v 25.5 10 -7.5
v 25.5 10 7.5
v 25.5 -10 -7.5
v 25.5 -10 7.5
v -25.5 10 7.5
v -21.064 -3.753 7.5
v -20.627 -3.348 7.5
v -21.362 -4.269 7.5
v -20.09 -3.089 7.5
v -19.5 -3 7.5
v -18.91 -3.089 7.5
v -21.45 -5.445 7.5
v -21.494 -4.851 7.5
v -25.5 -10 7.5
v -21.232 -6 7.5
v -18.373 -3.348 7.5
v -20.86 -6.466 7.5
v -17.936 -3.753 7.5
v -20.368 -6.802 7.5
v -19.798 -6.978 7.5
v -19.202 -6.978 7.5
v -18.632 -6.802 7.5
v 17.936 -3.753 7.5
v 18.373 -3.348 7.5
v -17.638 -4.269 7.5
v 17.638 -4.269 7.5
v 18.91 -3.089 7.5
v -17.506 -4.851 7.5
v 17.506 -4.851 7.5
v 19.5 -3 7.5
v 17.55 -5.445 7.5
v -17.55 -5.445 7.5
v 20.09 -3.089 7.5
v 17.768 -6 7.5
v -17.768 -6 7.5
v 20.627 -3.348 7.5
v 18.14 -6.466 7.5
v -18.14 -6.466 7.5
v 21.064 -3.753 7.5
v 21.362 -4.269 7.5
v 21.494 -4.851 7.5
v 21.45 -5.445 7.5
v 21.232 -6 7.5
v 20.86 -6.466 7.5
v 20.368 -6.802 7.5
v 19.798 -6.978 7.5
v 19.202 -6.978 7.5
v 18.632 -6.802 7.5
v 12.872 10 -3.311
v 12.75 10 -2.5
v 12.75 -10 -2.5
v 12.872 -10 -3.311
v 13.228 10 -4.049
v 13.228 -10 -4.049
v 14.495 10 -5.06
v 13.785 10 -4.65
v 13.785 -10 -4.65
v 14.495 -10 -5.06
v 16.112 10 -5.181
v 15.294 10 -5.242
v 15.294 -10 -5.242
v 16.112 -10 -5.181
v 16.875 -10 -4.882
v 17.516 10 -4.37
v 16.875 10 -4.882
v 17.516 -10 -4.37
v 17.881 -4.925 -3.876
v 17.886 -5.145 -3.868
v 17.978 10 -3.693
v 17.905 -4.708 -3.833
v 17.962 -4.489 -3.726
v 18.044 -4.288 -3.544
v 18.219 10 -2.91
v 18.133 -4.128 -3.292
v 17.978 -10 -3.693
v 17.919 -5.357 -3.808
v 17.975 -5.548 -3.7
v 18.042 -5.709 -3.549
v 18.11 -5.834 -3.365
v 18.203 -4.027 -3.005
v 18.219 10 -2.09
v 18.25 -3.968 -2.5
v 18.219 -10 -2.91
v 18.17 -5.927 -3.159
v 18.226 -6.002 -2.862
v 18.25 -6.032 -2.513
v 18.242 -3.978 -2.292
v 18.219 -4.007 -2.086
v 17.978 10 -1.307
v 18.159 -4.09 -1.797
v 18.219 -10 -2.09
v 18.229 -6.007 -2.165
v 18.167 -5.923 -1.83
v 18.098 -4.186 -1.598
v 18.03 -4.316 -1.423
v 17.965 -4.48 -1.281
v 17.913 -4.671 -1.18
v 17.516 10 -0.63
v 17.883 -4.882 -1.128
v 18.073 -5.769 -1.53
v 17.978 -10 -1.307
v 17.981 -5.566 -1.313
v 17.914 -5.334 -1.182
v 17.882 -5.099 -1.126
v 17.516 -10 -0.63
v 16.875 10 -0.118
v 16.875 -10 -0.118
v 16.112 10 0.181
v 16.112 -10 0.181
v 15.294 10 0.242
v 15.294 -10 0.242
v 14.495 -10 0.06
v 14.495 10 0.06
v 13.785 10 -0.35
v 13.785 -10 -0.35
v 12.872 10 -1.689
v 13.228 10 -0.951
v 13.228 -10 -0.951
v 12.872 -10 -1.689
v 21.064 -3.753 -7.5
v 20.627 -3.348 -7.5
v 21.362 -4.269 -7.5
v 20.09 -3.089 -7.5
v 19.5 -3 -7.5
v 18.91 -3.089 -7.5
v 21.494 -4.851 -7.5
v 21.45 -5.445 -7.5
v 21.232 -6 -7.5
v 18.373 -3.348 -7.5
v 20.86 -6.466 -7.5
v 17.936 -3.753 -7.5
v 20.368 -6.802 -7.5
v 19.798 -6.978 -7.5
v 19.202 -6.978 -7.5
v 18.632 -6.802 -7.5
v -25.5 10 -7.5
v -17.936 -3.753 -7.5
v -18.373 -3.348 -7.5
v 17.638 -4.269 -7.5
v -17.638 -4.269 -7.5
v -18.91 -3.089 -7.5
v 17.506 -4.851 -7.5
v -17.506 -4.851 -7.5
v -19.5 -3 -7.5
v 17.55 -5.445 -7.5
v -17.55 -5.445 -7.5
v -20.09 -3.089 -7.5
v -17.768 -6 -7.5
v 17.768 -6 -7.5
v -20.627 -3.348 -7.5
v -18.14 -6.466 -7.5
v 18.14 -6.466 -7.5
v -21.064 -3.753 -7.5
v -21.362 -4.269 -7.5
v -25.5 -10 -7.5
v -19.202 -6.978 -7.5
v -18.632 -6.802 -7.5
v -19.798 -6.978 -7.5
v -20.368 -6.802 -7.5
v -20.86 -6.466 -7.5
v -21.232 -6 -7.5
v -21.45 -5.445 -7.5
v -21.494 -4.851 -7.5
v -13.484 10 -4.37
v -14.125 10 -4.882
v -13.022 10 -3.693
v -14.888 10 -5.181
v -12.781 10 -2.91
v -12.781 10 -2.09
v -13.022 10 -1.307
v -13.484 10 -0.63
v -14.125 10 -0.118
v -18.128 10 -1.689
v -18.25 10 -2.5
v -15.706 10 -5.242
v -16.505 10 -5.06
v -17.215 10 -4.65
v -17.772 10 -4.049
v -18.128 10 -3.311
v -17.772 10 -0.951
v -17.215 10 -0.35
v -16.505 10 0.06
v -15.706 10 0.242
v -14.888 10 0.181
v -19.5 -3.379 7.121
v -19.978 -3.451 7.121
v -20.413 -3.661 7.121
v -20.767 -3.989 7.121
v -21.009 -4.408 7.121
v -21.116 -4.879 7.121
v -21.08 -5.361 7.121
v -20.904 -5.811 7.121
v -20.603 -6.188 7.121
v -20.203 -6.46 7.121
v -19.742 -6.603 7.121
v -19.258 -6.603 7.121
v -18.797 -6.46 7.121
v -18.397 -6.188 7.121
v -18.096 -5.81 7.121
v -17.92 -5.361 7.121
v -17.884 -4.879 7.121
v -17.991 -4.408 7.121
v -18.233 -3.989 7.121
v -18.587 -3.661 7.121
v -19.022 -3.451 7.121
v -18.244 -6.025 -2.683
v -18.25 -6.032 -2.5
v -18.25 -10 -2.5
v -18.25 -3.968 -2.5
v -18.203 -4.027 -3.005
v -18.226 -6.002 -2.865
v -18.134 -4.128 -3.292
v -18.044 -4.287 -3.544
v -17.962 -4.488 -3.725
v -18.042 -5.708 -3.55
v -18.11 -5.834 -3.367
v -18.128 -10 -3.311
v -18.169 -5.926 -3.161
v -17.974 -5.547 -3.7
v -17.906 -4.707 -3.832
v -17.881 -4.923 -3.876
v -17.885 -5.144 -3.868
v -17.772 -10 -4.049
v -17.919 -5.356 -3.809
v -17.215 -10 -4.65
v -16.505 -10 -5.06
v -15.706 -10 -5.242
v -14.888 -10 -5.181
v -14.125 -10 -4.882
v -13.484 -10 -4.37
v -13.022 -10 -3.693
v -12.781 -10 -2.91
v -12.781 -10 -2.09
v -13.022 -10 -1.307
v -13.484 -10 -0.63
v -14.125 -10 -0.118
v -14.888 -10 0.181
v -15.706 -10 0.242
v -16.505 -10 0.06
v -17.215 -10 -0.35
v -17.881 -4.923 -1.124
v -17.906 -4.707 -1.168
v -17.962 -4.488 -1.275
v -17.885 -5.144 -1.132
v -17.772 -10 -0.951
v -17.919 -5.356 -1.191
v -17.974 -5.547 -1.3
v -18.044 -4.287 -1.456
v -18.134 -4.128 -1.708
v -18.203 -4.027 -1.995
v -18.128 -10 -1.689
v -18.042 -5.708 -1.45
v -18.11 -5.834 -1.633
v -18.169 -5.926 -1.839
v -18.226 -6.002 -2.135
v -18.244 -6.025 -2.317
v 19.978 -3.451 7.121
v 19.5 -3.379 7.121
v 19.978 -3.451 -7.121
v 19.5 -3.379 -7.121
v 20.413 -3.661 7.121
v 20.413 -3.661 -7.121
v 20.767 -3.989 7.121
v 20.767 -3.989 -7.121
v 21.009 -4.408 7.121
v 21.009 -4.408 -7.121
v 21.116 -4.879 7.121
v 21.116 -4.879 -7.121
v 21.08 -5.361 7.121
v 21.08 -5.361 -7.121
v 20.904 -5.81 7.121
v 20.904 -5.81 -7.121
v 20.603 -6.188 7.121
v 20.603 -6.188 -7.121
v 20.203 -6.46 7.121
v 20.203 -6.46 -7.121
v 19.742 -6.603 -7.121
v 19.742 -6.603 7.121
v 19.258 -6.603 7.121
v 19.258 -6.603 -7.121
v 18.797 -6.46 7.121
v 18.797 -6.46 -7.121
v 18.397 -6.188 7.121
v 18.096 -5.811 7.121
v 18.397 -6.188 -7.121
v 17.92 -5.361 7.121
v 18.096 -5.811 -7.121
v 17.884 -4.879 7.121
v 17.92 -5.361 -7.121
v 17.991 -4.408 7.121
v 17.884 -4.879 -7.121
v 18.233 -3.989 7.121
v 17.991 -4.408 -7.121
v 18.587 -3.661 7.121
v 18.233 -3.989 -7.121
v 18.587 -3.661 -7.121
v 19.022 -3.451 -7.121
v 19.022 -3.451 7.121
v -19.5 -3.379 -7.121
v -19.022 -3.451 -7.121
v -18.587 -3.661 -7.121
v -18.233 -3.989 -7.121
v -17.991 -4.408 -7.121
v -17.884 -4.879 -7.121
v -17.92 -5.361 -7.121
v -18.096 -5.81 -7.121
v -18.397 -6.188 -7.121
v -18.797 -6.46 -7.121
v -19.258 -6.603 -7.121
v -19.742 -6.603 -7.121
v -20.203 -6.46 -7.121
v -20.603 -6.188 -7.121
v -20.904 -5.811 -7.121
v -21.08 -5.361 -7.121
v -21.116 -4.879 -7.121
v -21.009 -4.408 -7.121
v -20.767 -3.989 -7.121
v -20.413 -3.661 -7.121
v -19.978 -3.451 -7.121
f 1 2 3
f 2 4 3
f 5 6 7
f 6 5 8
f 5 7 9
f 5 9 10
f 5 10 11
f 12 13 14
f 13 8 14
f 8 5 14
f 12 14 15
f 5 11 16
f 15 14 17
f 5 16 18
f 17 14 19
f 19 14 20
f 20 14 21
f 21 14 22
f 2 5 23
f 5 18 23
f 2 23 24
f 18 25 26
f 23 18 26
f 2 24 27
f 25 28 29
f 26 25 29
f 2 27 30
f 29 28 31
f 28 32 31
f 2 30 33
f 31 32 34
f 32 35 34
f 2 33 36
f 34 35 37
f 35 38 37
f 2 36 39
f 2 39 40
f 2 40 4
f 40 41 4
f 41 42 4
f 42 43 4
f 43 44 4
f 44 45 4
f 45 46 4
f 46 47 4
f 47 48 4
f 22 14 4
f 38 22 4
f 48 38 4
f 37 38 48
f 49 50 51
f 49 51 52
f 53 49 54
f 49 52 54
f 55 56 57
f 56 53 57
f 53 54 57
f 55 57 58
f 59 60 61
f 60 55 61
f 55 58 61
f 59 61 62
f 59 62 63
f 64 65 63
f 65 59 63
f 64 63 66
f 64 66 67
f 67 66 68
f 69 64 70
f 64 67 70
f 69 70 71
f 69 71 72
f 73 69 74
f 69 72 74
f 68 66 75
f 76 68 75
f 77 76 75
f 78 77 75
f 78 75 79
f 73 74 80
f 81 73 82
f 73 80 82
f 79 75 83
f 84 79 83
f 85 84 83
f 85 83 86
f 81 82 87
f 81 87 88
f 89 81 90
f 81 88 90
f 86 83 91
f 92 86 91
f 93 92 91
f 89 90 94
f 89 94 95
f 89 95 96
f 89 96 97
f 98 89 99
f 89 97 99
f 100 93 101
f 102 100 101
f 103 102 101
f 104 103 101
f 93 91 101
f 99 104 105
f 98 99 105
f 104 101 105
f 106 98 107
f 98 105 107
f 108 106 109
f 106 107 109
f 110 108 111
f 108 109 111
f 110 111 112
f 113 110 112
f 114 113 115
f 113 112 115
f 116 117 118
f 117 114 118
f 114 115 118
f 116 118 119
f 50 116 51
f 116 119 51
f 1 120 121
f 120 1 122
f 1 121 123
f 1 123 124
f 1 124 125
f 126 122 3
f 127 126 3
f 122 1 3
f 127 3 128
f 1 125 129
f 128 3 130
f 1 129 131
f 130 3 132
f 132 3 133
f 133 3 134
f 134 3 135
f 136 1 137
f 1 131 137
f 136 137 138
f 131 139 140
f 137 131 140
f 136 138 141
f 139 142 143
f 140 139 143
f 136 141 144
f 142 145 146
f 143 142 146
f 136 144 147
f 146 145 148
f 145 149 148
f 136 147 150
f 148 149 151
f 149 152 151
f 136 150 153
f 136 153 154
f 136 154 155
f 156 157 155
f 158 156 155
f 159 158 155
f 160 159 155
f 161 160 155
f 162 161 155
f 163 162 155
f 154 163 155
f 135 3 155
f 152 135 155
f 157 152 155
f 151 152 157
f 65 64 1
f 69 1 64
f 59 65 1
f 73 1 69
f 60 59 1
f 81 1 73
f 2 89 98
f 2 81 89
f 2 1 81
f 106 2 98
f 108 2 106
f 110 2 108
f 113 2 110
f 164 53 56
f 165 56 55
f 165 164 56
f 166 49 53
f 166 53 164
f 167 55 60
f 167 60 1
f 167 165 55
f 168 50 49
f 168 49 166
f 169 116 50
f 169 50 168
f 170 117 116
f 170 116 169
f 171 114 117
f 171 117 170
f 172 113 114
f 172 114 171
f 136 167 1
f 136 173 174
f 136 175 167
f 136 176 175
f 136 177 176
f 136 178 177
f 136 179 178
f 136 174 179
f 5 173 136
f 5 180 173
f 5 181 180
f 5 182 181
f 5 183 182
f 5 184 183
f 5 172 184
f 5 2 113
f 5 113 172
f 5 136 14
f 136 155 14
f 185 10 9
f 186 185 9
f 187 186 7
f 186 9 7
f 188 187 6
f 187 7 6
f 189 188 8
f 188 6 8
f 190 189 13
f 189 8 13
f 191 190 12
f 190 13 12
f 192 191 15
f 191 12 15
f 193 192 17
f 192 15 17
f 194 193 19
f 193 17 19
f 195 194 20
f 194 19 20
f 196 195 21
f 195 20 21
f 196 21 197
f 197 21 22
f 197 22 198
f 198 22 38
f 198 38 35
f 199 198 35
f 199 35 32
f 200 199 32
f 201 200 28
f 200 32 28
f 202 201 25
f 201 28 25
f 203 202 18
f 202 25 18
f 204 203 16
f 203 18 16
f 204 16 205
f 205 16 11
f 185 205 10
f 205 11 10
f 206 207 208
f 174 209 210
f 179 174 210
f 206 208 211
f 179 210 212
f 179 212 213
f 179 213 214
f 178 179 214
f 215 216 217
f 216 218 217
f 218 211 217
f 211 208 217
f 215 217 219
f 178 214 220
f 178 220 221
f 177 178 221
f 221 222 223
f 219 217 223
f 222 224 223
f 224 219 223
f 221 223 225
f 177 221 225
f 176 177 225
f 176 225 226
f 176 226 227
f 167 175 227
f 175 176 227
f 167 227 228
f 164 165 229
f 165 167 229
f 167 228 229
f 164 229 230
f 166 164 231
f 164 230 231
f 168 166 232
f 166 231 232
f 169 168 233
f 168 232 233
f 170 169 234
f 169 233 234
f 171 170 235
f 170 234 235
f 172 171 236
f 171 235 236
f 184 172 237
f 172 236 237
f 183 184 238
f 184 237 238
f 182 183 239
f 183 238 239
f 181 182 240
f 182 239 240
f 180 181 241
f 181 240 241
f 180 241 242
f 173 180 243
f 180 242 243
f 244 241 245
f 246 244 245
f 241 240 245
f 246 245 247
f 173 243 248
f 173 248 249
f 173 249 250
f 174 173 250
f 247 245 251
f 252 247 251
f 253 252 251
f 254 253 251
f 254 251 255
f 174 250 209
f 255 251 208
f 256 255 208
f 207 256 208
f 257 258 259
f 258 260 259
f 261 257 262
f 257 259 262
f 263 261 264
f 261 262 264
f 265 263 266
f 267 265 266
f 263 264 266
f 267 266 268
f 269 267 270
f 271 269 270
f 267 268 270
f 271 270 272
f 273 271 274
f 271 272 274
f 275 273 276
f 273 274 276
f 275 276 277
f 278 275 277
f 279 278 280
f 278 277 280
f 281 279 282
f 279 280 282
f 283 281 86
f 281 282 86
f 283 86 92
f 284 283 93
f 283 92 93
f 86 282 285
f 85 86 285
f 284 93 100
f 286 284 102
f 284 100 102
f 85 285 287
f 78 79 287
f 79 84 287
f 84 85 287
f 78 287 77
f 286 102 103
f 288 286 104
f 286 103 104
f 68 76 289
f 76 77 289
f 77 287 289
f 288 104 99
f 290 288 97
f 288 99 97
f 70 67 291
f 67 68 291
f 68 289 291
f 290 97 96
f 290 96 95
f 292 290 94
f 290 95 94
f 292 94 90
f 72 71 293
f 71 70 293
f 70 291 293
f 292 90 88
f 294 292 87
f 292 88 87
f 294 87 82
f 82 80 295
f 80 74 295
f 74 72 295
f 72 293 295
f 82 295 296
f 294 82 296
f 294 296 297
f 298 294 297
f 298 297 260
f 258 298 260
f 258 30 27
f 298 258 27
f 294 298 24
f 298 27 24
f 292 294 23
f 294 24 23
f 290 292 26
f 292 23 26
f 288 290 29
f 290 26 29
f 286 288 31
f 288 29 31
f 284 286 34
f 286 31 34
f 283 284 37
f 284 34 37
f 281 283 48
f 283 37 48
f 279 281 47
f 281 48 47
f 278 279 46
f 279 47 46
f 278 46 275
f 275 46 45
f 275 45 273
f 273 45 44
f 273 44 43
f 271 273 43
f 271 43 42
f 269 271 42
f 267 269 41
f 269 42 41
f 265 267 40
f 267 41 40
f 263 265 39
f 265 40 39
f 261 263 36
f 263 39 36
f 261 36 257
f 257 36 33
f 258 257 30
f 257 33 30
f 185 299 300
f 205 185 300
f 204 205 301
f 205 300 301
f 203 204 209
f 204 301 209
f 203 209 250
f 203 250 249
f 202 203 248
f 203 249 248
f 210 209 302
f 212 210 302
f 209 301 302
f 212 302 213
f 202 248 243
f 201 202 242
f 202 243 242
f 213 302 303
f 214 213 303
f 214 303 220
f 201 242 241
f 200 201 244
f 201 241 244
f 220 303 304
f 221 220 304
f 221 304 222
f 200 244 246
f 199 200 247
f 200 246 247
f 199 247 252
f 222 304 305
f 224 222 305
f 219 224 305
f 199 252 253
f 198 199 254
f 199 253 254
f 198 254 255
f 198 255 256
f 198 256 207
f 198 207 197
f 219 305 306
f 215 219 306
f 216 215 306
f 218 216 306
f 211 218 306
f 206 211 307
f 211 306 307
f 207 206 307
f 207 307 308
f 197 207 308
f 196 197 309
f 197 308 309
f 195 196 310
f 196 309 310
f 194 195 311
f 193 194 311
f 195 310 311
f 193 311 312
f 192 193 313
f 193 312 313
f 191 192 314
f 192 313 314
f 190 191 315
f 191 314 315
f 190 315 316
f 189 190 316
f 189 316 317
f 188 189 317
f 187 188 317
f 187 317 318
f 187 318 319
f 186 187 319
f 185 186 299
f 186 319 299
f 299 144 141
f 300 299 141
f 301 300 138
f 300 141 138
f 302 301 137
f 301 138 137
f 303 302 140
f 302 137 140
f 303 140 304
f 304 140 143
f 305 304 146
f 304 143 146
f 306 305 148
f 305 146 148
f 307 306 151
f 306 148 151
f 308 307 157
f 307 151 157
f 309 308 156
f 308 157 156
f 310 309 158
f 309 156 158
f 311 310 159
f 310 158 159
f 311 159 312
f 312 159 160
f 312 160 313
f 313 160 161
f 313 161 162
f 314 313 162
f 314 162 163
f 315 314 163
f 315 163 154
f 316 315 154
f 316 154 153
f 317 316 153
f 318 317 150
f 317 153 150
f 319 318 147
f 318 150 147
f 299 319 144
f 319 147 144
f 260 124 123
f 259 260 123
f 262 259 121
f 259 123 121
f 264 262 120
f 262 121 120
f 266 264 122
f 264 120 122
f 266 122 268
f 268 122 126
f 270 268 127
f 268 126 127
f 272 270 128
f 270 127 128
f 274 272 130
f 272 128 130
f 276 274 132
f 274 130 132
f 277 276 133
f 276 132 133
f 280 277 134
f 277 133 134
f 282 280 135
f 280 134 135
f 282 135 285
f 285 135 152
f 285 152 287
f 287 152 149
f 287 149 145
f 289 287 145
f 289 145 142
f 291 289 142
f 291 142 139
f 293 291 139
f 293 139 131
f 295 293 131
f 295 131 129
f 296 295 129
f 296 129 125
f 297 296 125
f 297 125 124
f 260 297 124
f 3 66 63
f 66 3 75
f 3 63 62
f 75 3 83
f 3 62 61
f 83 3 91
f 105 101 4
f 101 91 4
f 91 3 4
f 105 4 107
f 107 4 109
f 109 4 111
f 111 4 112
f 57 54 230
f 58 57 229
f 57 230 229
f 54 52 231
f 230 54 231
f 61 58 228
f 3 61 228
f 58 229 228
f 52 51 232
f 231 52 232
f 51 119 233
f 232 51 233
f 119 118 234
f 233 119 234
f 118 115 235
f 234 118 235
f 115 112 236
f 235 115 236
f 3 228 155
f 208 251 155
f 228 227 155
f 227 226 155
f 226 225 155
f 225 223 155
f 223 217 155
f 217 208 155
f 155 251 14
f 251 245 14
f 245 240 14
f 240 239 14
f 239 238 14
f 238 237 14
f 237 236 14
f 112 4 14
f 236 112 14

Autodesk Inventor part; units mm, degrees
sketch "Sketch_14" plane through (0, 0, 0) normal (0, 1, 0) x (-1, 0, 0)
  line L0 (25.5, 7.5) -> (-25.5, 7.5)
  line L1 (-25.5, 7.5) -> (-25.5, -7.5)
  line L2 (-25.5, -7.5) -> (25.5, -7.5)
  line L3 (25.5, -7.5) -> (25.5, 7.5)
  circle A0 centre (-15.5, -2.5) radius 2.75
  circle A1 centre (15.5, -2.5) radius 2.75
extrude "Extrusion1" add sketch "Sketch_14" along normal mid plane 20
sketch "Sketch_2" plane through (19.5, 0, 0) normal (1, 0, 0) x (0, 0, -1)
  line L0 (7.5, -5) -> (-7.5, -5)
  line L1 (-7.5, -5) -> (-7.5, -3)
  line L2 (-7.5, -3) -> (-7.121, -3.379)
  line L3 (-7.121, -3.379) -> (7.121, -3.379)
  line L4 (7.121, -3.379) -> (7.5, -3)
  line L5 (7.5, -3) -> (7.5, -5)
  line L6 (7.5, -5) -> (-7.5, -5)
revolve "Revolution1" cut sketch "Sketch_2" angle 360 about axis through (19.5, -5, -7.5) along (0, 0, -1)
thread "Thread1" size "M4x0.7" class "6H" standard "ISO Metric profile" full length
sketch "Sketch_3" plane through (-19.5, 0, 0) normal (1, 0, 0) x (0, 0, -1)
  line L0 (7.5, -5) -> (-7.5, -5)
  line L1 (-7.5, -5) -> (-7.5, -3)
  line L2 (-7.5, -3) -> (-7.121, -3.379)
  line L3 (-7.121, -3.379) -> (7.121, -3.379)
  line L4 (7.121, -3.379) -> (7.5, -3)
  line L5 (7.5, -3) -> (7.5, -5)
  line L6 (7.5, -5) -> (-7.5, -5)
revolve "Revolution2" cut sketch "Sketch_3" angle 360 about axis through (-19.5, -5, -7.5) along (0, 0, -1)
thread "Thread2" size "M4x0.7" class "6H" standard "ISO Metric profile" full length
ref_plane "att_plate_magnet_XY" through (19.5, -5, 7.5) normal (0, 0, 1) x (1, 0, 0)
ref_plane "att_plate_magnet_YZ" through (19.5, -5, 7.5) normal (1, 0, 0) x (0, 1, 0)
ref_plane "att_plate_magnet_ZX" through (19.5, -5, 7.5) normal (0, 1, 0) x (0, 0, 1)
ref_plane "to_magnetT_XY" through (-19.5, -5, 7.5) normal (0, 0, 1) x (1, 0, 0)
ref_plane "to_magnetT_YZ" through (-19.5, -5, 7.5) normal (1, 0, 0) x (0, 1, 0)
ref_plane "to_magnetT_ZX" through (-19.5, -5, 7.5) normal (0, 1, 0) x (0, 0, 1)
ref_plane "c1_XY" through (-15.5, 10, -2.5) normal (0, 1, 0) x (1, 0, 0)
ref_plane "c1_YZ" through (-15.5, 10, -2.5) normal (1, 0, 0) x (0, 0, -1)
ref_plane "c1_ZX" through (-15.5, 10, -2.5) normal (0, 0, -1) x (0, 1, 0)
ref_plane "c2_XY" through (15.5, 10, -2.5) normal (0, 1, 0) x (1, 0, 0)
ref_plane "c2_YZ" through (15.5, 10, -2.5) normal (1, 0, 0) x (0, 0, -1)
ref_plane "c2_ZX" through (15.5, 10, -2.5) normal (0, 0, -1) x (0, 1, 0)
ref_plane "c3_XY" through (-15.5, -10, -2.5) normal (0, 1, 0) x (1, 0, 0)
ref_plane "c3_YZ" through (-15.5, -10, -2.5) normal (1, 0, 0) x (0, 0, -1)
ref_plane "c3_ZX" through (-15.5, -10, -2.5) normal (0, 0, -1) x (0, 1, 0)
ref_plane "c4_XY" through (15.5, -10, -2.5) normal (0, 1, 0) x (1, 0, 0)
ref_plane "c4_YZ" through (15.5, -10, -2.5) normal (1, 0, 0) x (0, 0, -1)
ref_plane "c4_ZX" through (15.5, -10, -2.5) normal (0, 0, -1) x (0, 1, 0)
ref_plane "cc3_XY" through (-15.5, 10, -2.5) normal (0, 1, 0) x (1, 0, 0)
ref_plane "cc3_YZ" through (-15.5, 10, -2.5) normal (1, 0, 0) x (0, 0, -1)
ref_plane "cc3_ZX" through (-15.5, 10, -2.5) normal (0, 0, -1) x (0, 1, 0)
ref_plane "cc4_XY" through (15.5, 10, -2.5) normal (0, 1, 0) x (1, 0, 0)
ref_plane "cc4_YZ" through (15.5, 10, -2.5) normal (1, 0, 0) x (0, 0, -1)
ref_plane "cc4_ZX" through (15.5, 10, -2.5) normal (0, 0, -1) x (0, 1, 0)
ref_plane "cc1_XY" through (-15.5, -10, -2.5) normal (0, 1, 0) x (1, 0, 0)
ref_plane "cc1_YZ" through (-15.5, -10, -2.5) normal (1, 0, 0) x (0, 0, -1)
ref_plane "cc1_ZX" through (-15.5, -10, -2.5) normal (0, 0, -1) x (0, 1, 0)
ref_plane "cc2_XY" through (15.5, -10, -2.5) normal (0, 1, 0) x (1, 0, 0)
ref_plane "cc2_YZ" through (15.5, -10, -2.5) normal (1, 0, 0) x (0, 0, -1)
ref_plane "cc2_ZX" through (15.5, -10, -2.5) normal (0, 0, -1) x (0, 1, 0)
ref_plane "d1_XY" through (15.5, 15, -5) normal (0, 1, 0) x (1, 0, 0)
ref_plane "d1_YZ" through (15.5, 15, -5) normal (1, 0, 0) x (0, 0, -1)
ref_plane "d1_ZX" through (15.5, 15, -5) normal (0, 0, -1) x (0, 1, 0)
ref_plane "d2_XY" through (-15.5, 15, -5) normal (0, 1, 0) x (1, 0, 0)
ref_plane "d2_YZ" through (-15.5, 15, -5) normal (1, 0, 0) x (0, 0, -1)
ref_plane "d2_ZX" through (-15.5, 15, -5) normal (0, 0, -1) x (0, 1, 0)
ref_plane "e1_XY" through (-15.5, 15, -5) normal (0, 1, 0) x (1, 0, 0)
ref_plane "e1_YZ" through (-15.5, 15, -5) normal (1, 0, 0) x (0, 0, -1)
ref_plane "e1_ZX" through (-15.5, 15, -5) normal (0, 0, -1) x (0, 1, 0)
ref_plane "e2_XY" through (15.5, 15, -5) normal (0, 1, 0) x (1, 0, 0)
ref_plane "e2_YZ" through (15.5, 15, -5) normal (1, 0, 0) x (0, 0, -1)
ref_plane "e2_ZX" through (15.5, 15, -5) normal (0, 0, -1) x (0, 1, 0)
ref_plane "p1_XY" through (15.5, 10, 0) normal (0, 1, 0) x (1, 0, 0)
ref_plane "p1_YZ" through (15.5, 10, 0) normal (1, 0, 0) x (0, 0, -1)
ref_plane "p1_ZX" through (15.5, 10, 0) normal (0, 0, -1) x (0, 1, 0)
ref_plane "p2_XY" through (-15.5, 10, 0) normal (0, 1, 0) x (1, 0, 0)
ref_plane "p2_YZ" through (-15.5, 10, 0) normal (1, 0, 0) x (0, 0, -1)
ref_plane "p2_ZX" through (-15.5, 10, 0) normal (0, 0, -1) x (0, 1, 0)
ref_plane "xxxx_XY" through (0, 0, 0) normal (0, 0, 1) x (1, 0, 0)
ref_plane "xxxx_YZ" through (0, 0, 0) normal (1, 0, 0) x (0, 1, 0)
ref_plane "xxxx_ZX" through (0, 0, 0) normal (0, 1, 0) x (0, 0, 1)
ref_plane "p11_XY" through (15.5, 10, 31) normal (0, 1, 0) x (1, 0, 0)
ref_plane "p11_YZ" through (15.5, 10, 31) normal (1, 0, 0) x (0, 0, -1)
ref_plane "p11_ZX" through (15.5, 10, 31) normal (0, 0, -1) x (0, 1, 0)
ref_plane "p22_XY" through (-15.5, 10, 31) normal (0, 1, 0) x (1, 0, 0)
ref_plane "p22_YZ" through (-15.5, 10, 31) normal (1, 0, 0) x (0, 0, -1)
ref_plane "p22_ZX" through (-15.5, 10, 31) normal (0, 0, -1) x (0, 1, 0)
ref_plane "plate_to_magnet_XY" through (-19.5, -5, 7.5) normal (0, 1, 0) x (1, 0, 0)
ref_plane "plate_to_magnet_YZ" through (-19.5, -5, 7.5) normal (1, 0, 0) x (0, 0, -1)
ref_plane "plate_to_magnet_ZX" through (-19.5, -5, 7.5) normal (0, 0, -1) x (0, 1, 0)
properties part number "MG5-5-ap"
